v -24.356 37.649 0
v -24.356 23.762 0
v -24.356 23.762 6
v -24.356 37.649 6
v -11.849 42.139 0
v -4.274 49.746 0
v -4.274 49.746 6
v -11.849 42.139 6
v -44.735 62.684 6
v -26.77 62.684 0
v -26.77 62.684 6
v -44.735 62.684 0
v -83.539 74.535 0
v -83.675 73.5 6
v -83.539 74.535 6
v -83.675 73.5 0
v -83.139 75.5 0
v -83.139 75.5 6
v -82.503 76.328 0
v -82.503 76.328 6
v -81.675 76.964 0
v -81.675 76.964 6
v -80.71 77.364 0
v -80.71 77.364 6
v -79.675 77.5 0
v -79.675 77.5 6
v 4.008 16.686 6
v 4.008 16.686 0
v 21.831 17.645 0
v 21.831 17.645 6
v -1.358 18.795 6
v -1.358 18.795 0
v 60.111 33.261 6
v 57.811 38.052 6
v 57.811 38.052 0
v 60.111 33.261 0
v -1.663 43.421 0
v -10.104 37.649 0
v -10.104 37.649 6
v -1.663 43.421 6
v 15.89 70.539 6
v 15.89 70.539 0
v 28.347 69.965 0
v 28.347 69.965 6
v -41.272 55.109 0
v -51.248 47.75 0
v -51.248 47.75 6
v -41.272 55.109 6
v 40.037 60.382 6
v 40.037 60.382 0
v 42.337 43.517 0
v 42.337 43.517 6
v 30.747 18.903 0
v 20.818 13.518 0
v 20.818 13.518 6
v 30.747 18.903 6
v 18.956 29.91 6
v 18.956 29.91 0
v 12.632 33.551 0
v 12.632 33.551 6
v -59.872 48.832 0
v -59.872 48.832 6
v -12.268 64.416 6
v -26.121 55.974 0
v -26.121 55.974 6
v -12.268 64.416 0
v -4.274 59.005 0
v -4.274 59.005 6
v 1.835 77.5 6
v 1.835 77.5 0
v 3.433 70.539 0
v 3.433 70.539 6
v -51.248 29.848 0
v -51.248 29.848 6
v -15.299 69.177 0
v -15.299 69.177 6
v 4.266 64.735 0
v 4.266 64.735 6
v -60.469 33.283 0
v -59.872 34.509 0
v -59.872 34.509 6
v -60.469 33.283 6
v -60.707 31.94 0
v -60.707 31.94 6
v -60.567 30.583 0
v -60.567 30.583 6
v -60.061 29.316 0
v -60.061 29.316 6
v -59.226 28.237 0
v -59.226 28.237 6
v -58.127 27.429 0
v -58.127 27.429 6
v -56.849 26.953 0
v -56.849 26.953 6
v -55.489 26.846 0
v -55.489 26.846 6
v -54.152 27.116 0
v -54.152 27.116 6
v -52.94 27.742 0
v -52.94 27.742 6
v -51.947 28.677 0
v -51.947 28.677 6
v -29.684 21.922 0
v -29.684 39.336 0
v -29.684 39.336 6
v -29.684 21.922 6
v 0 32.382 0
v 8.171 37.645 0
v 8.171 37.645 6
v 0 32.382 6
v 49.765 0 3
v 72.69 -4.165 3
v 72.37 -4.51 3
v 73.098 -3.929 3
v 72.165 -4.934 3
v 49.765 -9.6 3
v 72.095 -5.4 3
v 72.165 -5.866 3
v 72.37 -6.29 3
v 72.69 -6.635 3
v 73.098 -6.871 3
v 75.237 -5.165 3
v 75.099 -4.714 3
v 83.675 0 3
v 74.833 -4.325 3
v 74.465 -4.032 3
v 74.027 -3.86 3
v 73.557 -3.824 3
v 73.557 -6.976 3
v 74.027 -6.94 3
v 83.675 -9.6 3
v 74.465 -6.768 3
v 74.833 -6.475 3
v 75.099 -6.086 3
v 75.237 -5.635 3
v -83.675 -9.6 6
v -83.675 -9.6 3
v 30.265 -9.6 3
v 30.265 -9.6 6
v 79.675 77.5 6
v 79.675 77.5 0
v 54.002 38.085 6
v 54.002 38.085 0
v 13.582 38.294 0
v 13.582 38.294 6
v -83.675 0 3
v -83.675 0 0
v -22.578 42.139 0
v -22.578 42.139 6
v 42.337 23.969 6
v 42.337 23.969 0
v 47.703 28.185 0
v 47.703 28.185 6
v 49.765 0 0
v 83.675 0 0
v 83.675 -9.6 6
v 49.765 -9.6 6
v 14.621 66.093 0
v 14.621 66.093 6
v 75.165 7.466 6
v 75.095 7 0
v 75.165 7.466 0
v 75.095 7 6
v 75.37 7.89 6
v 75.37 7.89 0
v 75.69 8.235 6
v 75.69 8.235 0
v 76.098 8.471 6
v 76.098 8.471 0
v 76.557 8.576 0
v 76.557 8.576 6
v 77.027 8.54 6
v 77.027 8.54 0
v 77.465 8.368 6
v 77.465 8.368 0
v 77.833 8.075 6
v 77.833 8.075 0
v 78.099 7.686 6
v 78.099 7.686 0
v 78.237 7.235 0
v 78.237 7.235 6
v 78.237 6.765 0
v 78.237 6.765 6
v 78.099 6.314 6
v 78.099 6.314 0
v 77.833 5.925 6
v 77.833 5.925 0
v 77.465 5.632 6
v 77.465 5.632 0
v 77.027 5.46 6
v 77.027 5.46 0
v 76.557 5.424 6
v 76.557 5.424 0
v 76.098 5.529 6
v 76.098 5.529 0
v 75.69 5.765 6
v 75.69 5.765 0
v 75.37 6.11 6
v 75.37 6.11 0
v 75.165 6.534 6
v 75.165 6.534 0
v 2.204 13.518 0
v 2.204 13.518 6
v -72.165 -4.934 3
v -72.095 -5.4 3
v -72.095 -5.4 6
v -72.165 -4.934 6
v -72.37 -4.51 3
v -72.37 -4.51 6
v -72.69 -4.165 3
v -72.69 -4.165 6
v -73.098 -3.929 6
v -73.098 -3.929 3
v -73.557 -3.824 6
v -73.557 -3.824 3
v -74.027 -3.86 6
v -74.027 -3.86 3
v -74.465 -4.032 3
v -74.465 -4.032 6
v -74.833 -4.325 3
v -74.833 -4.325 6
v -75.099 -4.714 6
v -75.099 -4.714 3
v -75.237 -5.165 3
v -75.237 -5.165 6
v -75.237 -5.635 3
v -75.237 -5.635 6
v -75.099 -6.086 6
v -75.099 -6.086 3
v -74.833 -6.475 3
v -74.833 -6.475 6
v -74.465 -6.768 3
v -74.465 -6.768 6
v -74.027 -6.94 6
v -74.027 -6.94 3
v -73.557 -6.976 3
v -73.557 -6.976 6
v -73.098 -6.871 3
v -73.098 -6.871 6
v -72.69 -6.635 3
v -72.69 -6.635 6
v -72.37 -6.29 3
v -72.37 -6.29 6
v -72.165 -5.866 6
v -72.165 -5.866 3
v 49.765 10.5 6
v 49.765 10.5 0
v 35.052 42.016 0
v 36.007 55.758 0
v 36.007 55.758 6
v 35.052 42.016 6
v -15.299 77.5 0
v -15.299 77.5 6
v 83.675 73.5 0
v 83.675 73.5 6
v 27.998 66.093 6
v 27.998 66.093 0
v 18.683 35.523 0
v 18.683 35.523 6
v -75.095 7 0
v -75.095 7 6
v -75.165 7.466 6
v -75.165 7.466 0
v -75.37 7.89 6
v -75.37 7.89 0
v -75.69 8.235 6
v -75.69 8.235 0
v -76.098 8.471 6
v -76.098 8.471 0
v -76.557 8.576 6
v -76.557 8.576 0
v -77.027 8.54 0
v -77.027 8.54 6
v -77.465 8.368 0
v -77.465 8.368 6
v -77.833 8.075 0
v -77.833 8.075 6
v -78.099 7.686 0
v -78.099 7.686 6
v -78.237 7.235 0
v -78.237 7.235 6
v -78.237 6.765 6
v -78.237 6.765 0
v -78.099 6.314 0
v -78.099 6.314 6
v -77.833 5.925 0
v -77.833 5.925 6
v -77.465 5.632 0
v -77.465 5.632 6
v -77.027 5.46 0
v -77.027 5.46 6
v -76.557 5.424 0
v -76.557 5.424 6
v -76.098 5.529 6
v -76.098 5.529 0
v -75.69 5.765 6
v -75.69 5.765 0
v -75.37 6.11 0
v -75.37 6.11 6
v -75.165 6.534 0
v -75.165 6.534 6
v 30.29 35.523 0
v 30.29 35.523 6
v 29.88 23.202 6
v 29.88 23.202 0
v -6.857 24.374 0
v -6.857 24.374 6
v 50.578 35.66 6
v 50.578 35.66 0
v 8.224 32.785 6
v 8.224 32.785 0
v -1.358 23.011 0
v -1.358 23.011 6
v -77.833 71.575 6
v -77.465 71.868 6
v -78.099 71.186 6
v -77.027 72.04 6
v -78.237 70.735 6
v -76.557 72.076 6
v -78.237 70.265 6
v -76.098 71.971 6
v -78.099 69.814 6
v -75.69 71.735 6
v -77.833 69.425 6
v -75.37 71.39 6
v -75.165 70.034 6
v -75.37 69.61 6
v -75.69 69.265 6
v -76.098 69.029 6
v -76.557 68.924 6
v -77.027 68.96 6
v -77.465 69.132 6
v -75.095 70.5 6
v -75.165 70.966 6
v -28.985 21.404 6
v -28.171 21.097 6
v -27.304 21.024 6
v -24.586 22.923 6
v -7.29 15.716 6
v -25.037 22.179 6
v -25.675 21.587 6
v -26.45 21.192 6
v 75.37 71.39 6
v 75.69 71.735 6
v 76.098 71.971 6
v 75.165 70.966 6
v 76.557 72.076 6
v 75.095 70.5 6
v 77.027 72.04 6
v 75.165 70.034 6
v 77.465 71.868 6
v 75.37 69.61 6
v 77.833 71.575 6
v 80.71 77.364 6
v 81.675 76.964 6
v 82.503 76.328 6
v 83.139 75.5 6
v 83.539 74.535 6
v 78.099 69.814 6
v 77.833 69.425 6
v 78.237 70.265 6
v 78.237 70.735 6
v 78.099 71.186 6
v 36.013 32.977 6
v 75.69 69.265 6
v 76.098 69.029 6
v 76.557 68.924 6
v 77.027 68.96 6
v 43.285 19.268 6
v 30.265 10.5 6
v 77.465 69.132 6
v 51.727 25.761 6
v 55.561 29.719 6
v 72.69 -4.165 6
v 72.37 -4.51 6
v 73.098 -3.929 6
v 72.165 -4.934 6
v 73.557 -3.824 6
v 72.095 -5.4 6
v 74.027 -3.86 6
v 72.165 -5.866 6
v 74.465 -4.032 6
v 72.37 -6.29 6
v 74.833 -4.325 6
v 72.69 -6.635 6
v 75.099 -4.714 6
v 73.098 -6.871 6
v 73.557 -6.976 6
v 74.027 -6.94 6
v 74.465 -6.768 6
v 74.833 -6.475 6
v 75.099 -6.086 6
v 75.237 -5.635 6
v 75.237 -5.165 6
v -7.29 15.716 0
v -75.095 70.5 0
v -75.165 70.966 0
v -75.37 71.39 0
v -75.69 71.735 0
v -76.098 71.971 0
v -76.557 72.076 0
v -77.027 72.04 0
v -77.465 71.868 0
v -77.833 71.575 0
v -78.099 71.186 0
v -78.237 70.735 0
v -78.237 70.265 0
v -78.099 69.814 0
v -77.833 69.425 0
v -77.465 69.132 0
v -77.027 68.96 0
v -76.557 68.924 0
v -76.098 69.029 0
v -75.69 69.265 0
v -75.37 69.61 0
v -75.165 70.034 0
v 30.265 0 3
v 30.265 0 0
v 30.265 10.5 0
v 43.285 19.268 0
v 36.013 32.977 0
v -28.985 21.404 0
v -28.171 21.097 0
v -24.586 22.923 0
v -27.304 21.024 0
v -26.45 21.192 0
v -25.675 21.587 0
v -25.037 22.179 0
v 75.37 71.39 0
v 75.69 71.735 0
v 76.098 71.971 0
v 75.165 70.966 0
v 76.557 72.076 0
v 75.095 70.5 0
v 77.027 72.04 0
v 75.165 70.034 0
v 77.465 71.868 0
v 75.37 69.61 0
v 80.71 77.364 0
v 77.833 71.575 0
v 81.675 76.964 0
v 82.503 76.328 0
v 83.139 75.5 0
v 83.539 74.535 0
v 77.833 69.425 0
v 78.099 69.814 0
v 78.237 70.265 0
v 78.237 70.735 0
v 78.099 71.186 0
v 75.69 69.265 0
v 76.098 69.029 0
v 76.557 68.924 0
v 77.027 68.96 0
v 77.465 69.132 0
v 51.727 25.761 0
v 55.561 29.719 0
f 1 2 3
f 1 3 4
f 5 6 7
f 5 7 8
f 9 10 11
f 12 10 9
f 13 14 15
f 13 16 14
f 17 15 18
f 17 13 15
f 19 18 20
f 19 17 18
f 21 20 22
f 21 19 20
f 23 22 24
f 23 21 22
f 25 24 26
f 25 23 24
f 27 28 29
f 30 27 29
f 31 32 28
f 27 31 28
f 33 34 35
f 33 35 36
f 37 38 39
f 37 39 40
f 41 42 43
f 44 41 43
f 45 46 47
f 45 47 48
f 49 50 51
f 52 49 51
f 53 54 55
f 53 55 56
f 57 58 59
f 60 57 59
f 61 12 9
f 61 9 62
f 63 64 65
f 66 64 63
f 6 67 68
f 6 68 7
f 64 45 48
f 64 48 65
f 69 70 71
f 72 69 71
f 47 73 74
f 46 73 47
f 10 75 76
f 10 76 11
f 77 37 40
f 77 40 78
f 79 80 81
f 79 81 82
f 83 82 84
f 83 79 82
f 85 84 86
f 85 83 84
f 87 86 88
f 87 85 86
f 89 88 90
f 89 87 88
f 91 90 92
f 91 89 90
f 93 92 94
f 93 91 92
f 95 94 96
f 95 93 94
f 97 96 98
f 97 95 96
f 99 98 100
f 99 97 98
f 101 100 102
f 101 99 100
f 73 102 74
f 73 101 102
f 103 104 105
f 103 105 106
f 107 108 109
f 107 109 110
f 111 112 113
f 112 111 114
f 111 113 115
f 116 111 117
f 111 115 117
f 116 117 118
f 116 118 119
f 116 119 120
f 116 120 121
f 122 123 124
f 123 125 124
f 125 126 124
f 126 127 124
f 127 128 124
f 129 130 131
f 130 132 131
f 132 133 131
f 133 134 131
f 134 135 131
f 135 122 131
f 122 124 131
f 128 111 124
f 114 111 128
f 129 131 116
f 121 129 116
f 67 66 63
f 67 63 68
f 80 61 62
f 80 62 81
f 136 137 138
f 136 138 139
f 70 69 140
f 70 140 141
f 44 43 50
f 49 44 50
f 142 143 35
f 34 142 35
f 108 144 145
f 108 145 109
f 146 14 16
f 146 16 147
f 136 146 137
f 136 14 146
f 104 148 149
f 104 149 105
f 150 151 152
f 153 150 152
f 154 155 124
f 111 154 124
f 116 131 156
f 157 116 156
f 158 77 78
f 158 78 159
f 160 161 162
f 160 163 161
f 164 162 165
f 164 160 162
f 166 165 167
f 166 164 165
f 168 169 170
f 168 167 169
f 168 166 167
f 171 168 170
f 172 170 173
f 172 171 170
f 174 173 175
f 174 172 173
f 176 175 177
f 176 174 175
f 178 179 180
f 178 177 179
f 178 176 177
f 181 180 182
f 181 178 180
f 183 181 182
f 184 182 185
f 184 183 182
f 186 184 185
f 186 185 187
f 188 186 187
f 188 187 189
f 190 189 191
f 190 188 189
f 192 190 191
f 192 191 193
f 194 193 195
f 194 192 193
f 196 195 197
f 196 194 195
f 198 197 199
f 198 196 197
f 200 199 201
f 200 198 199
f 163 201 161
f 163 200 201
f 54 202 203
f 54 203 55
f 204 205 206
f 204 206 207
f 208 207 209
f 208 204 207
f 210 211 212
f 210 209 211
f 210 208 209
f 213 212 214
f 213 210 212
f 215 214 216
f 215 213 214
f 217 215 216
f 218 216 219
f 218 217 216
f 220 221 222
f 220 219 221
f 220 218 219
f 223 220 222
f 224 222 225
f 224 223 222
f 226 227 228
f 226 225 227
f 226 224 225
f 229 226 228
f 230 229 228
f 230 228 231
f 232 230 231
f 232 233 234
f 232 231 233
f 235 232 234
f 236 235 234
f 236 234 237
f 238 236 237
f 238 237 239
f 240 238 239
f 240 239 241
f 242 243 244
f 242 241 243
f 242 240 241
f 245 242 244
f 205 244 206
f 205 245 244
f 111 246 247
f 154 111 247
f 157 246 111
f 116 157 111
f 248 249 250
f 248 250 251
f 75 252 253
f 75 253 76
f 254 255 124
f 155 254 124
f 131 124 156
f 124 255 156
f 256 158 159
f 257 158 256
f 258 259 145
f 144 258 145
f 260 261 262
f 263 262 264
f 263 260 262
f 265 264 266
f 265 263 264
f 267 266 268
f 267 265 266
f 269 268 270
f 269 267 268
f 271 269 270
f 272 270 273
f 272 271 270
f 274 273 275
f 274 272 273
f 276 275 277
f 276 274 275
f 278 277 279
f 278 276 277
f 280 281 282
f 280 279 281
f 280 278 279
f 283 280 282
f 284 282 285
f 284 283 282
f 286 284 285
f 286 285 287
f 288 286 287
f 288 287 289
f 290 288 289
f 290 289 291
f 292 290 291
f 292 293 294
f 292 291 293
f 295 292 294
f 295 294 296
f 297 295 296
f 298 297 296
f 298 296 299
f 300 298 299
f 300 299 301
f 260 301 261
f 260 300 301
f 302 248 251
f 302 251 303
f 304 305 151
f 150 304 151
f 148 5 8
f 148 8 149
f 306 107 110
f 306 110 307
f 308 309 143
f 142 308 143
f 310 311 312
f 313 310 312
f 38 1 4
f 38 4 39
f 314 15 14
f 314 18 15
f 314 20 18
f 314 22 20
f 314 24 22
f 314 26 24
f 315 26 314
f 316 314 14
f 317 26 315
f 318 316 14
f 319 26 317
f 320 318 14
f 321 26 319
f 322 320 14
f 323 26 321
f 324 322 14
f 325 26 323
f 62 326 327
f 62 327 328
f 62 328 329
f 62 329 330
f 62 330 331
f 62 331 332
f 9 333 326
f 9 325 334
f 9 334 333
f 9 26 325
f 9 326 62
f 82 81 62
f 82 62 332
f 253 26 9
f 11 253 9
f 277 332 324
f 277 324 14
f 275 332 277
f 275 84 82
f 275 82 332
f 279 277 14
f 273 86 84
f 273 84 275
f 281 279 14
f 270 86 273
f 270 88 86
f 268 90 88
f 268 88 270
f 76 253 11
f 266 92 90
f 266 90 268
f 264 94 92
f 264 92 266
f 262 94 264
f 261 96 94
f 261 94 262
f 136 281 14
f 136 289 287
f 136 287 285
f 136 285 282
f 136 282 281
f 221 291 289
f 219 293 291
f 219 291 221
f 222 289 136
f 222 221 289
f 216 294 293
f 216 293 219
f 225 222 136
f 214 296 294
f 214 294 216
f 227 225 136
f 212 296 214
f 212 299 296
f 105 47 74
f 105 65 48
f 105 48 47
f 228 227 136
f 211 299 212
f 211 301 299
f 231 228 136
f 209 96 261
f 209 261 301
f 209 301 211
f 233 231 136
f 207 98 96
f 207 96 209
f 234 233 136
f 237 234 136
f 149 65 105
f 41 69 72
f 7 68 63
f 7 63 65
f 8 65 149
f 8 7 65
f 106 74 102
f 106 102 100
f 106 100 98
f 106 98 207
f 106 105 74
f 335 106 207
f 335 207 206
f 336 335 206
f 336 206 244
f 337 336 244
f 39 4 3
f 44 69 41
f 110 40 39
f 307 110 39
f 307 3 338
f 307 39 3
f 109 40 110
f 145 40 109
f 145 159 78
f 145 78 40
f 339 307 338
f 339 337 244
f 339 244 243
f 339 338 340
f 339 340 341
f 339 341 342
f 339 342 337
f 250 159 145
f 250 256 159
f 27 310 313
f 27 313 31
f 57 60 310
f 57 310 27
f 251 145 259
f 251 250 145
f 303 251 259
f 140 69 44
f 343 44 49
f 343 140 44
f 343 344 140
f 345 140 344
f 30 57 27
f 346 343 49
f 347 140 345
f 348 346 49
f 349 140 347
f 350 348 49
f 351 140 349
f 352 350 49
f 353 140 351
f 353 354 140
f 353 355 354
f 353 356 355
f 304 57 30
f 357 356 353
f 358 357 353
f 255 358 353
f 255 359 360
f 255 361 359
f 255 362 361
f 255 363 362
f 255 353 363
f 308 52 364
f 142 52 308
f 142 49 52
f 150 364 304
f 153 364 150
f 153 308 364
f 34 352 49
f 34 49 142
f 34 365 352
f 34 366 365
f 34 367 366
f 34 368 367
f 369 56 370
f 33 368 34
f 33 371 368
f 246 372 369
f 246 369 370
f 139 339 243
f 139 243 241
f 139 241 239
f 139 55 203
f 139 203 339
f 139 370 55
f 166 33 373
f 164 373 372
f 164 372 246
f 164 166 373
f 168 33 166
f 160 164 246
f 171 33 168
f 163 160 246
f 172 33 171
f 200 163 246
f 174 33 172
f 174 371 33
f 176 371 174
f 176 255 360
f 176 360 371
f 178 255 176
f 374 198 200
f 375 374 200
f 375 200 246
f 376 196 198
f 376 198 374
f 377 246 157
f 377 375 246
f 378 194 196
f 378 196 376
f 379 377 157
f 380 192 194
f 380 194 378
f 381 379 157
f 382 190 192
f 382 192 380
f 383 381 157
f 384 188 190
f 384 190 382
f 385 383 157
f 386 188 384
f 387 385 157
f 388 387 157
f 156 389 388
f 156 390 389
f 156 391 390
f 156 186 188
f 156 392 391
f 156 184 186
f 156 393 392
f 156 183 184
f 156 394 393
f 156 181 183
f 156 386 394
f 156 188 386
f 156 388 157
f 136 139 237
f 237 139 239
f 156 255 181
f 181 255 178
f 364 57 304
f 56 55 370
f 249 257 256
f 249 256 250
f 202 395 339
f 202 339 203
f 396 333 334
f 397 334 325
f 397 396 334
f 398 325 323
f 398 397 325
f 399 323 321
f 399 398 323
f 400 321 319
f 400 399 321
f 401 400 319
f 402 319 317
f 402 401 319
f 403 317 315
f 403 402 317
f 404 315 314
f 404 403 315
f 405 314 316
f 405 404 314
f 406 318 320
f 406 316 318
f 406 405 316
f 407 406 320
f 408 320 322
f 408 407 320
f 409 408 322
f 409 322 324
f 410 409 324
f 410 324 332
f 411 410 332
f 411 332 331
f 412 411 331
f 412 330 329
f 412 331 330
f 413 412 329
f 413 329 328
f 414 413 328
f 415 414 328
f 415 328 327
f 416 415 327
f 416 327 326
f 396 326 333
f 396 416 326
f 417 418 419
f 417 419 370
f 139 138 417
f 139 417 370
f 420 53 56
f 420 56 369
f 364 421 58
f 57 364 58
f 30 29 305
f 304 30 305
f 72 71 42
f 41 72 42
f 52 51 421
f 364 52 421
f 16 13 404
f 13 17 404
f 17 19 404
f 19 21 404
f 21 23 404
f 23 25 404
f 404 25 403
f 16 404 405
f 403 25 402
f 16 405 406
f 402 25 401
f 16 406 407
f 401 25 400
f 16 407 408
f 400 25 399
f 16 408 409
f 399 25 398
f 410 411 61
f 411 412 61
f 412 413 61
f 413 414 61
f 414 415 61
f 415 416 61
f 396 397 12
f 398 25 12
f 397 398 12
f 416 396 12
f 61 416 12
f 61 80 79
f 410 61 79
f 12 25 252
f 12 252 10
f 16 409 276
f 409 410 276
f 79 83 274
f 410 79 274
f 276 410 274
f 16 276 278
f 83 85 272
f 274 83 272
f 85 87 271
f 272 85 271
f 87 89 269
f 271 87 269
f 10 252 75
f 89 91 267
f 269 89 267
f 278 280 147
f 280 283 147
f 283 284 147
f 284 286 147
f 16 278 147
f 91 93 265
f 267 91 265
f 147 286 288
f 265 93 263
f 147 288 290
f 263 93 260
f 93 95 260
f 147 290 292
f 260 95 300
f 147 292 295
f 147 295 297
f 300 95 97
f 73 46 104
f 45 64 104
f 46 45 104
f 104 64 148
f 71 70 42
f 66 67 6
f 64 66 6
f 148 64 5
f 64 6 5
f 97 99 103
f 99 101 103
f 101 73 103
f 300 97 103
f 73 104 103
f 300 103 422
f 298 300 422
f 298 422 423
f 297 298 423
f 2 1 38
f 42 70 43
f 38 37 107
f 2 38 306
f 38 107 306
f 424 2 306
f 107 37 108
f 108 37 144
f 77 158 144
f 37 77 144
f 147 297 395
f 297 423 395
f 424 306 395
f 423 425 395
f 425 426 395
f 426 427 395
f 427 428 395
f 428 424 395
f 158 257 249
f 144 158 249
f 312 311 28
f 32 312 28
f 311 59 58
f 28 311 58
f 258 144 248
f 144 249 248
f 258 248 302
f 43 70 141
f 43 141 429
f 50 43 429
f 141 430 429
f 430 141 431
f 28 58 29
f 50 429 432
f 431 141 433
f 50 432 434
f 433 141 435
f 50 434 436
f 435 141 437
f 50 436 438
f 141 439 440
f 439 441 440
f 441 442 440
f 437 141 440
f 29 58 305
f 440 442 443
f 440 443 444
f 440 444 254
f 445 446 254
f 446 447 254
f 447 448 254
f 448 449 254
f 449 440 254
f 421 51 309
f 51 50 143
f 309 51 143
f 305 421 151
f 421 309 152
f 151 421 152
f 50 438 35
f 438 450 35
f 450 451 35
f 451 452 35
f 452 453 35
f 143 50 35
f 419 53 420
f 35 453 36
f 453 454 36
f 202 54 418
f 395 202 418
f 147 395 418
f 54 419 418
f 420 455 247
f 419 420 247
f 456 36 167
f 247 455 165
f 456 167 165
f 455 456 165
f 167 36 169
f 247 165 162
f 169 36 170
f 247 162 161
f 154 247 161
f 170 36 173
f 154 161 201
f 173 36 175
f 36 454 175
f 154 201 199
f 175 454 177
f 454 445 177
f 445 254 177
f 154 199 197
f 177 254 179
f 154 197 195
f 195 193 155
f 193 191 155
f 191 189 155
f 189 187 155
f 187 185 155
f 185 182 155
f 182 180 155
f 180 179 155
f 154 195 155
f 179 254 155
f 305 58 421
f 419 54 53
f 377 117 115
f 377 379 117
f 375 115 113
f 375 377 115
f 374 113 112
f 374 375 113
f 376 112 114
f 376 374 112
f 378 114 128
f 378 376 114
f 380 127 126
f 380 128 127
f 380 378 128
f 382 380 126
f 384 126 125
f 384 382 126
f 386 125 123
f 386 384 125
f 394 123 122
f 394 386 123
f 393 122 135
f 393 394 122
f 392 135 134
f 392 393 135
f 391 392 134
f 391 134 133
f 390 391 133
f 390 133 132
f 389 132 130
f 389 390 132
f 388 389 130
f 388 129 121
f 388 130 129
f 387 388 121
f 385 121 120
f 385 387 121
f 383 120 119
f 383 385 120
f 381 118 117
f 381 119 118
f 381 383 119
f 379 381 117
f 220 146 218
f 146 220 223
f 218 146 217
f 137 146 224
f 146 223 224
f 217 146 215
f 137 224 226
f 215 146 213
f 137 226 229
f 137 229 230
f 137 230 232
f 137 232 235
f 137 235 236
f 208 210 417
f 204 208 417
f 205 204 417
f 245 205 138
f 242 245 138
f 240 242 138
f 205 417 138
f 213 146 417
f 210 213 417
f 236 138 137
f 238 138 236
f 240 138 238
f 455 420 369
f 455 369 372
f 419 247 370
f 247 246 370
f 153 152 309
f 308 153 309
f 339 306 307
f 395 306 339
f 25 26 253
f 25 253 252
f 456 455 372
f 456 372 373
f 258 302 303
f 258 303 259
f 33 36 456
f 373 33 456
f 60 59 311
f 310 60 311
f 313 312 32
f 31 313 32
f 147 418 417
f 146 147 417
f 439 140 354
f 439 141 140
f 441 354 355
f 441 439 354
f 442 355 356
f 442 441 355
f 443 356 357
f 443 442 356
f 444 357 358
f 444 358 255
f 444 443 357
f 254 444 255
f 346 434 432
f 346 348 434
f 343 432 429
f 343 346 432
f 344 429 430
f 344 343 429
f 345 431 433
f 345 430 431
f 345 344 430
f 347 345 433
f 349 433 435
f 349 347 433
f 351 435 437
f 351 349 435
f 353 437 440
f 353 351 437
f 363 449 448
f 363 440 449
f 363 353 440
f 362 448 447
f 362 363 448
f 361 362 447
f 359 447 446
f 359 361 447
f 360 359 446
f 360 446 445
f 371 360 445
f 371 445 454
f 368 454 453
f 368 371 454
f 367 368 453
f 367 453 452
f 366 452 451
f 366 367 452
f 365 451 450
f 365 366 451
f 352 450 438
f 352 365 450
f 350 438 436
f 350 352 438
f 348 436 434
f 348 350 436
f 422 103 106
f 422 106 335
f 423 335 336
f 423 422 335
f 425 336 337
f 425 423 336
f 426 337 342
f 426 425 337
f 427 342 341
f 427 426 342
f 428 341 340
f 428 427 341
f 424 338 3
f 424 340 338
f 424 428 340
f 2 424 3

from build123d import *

# Parameters (mm, degrees)
PAD_DEPTH            = 83.675
SKETCH001_R          = 1.58
POCKET_DEPTH         = 377.510907
POCKET_DEPTH_BACK    = 383.510907
SKETCH002_R          = 1.58
POCKET001_DEPTH      = 377.510907
POCKET001_DEPTH_BACK = 383.510907
FILLET_R             = 4
POCKET002_DEPTH      = 0.001
POCKET002_DEPTH_BACK = 6.001
POCKET003_DEPTH      = 10.5


with BuildPart() as part:
    # Sketch → Pad (new body, symmetric)
    with BuildSketch(Plane.YZ):
        Polygon((0, 6), (77.5, 6), (77.5, 0), (0, 0), (0, 3), (-9.6, 3), (-9.6, 6), align=None)
    extrude(amount=PAD_DEPTH, both=True)

    # Sketch001 → Pocket (cut, two sides)
    with BuildSketch(Plane.XY) as pocket_sk:
        with Locations((-73.675, -5.4)):
            Circle(SKETCH001_R)
    pocket = extrude(amount=-POCKET_DEPTH, mode=Mode.SUBTRACT) + extrude(pocket_sk.sketch, amount=POCKET_DEPTH_BACK, mode=Mode.SUBTRACT)

    # Mirrored: Pocket across Sketch001 V_Axis
    add(pocket.mirror(Plane(origin=(0, 0, 0), x_dir=(0, 0, 1), z_dir=(1, 0, 0))), mode=Mode.SUBTRACT)

    # Sketch002 → Pocket001 (cut, two sides)
    with BuildSketch(Plane.XY) as pocket001_sk:
        with Locations((-76.675, 7)):
            Circle(SKETCH002_R)
        with Locations((-76.675, 70.5)):
            Circle(SKETCH002_R)
    pocket001 = extrude(amount=-POCKET001_DEPTH, mode=Mode.SUBTRACT) + extrude(pocket001_sk.sketch, amount=POCKET001_DEPTH_BACK, mode=Mode.SUBTRACT)

    # Mirrored001: Pocket001 across Sketch002 V_Axis
    add(pocket001.mirror(Plane(origin=(0, 0, 0), x_dir=(0, 0, 1), z_dir=(1, 0, 0))), mode=Mode.SUBTRACT)

    # Fillet
    fillet_edges = [part.edges().sort_by_distance(p)[0] for p in [
        (-83.675, 77.5, 3),
        (83.675, 77.5, 3),
    ]]
    fillet(fillet_edges, radius=FILLET_R)

    # Sketch003 → Pocket002 (cut, two sides)
    with BuildSketch(Plane.XY) as pocket002_sk:
        with BuildLine():
            Line((0, 85.498085), (-15.298519, 85.498085))
            Line((-15.298519, 85.498085), (-15.298519, 69.177368))
            Line((-15.298519, 69.177368), (-26.769978, 62.684086))
            Line((-26.769978, 62.684086), (-44.734715, 62.684086))
            Line((-44.734715, 62.684086), (-59.872273, 48.831764))
            Line((-59.872273, 48.831764), (-59.872273, 34.509105))
            ThreePointArc((-59.872273, 34.509105), (-58.127246, 27.428906), (-51.248122, 29.847994))
            Line((-51.248122, 29.847994), (-51.248122, 47.74955))
            Line((-51.248122, 47.74955), (-41.271629, 55.108601))
            Line((-41.271629, 55.108601), (-26.120649, 55.974365))
            Line((-26.120649, 55.974365), (-12.268326, 64.415634))
            Line((-12.268326, 64.415634), (-4.273829, 59.00457))
            Line((-4.273829, 59.00457), (-4.273829, 49.746376))
            Line((-4.273829, 49.746376), (-11.849321, 42.138565))
            Line((-11.849321, 42.138565), (-22.578484, 42.138565))
            Line((-22.578484, 42.138565), (-29.684225, 39.336304))
            Line((-29.684225, 39.336304), (-29.684225, 21.921904))
            ThreePointArc((-29.684225, 21.921904), (-26.450024, 21.191665), (-24.355623, 23.762032))
            Line((-24.355623, 23.762032), (-24.355623, 37.648584))
            Line((-24.355623, 37.648584), (-10.103902, 37.648584))
            Line((-10.103902, 37.648584), (-1.662641, 43.420704))
            Line((-1.662641, 43.420704), (4.266177, 64.735275))
            Line((4.266177, 64.735275), (14.620769, 66.093262))
            Line((14.620769, 66.093262), (27.998238, 66.093262))
            Line((27.998238, 66.093262), (36.006613, 55.757923))
            Line((36.006613, 55.757923), (35.051826, 42.016021))
            Line((35.051826, 42.016021), (30.290104, 35.52275))
            Line((30.290104, 35.52275), (18.682957, 35.52275))
            Line((18.682957, 35.52275), (13.581733, 38.294209))
            Line((13.581733, 38.294209), (8.170669, 37.644886))
            Line((8.170669, 37.644886), (0, 32.382126))
            Line((0, 32.382126), (-6.857254, 24.373747))
            Line((-6.857254, 24.373747), (-7.290145, 15.716045))
            Line((-7.290145, 15.716045), (2.203666, 13.517555))
            Line((2.203666, 13.517555), (20.817725, 13.517555))
            Line((20.817725, 13.517555), (30.746775, 18.903475))
            Line((30.746775, 18.903475), (43.285458, 19.26811))
            Line((43.285458, 19.26811), (51.726704, 25.761387))
            Line((51.726704, 25.761387), (55.560936, 29.718502))
            Line((60.111149, 33.261222), (55.560936, 29.718502))
            Line((57.811371, 38.052417), (60.111149, 33.261222))
            Line((54.002171, 38.084934), (57.811371, 38.052417))
            Line((50.578094, 35.659588), (54.002171, 38.084934))
            Line((47.703377, 28.185322), (50.578094, 35.659588))
            Line((42.337234, 23.969067), (47.703377, 28.185322))
            Line((29.880125, 23.202477), (42.337234, 23.969067))
            Line((21.830915, 17.64469), (29.880125, 23.202477))
            Line((4.007673, 16.686453), (21.830915, 17.64469))
            Line((-1.358464, 18.794577), (4.007673, 16.686453))
            Line((-1.358464, 23.01083), (-1.358464, 18.794577))
            Line((8.223927, 32.78487), (-1.358464, 23.01083))
            Line((12.631821, 33.55146), (8.223927, 32.78487))
            Line((18.9562, 29.910152), (12.631821, 33.55146))
            Line((36.012859, 32.976517), (18.9562, 29.910152))
            Line((42.337234, 43.517147), (36.012859, 32.976517))
            Line((40.037453, 60.382156), (42.337234, 43.517147))
            Line((28.346945, 69.964546), (40.037453, 60.382156))
            Line((15.889835, 70.53949), (28.346945, 69.964546))
            Line((3.432726, 70.53949), (15.889835, 70.53949))
            Line((0, 85.498085), (3.432726, 70.53949))
        make_face()
    extrude(amount=-POCKET002_DEPTH, mode=Mode.SUBTRACT)
    extrude(pocket002_sk.sketch, amount=POCKET002_DEPTH_BACK, mode=Mode.SUBTRACT)

    # Sketch004 → Pocket003 (cut, symmetric)
    with BuildSketch(Plane.XZ):
        Polygon((40.015, 0), (30.265, 0), (30.265, 8), (40.015, 8), (49.765, 8), (49.765, 0), align=None)
    extrude(amount=POCKET003_DEPTH, both=True, mode=Mode.SUBTRACT)


solid = part.part
